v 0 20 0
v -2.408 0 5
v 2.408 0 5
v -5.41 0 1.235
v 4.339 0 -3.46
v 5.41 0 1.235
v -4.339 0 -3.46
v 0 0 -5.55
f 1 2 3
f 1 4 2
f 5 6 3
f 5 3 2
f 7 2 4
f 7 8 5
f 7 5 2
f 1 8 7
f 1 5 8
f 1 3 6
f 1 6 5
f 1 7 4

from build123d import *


with BuildPart() as part:
    # Sketch1 → Loft1 section 0
    with BuildSketch(Plane(origin=(0, 0, 0), x_dir=(1, 0, 0), z_dir=(0, 1, 0)), mode=Mode.PRIVATE) as loft1_s0:
        Polygon((5.410441731, -1.234898019), (4.338837391, 3.460107358), (0, 5.549581321), (-4.338837391, 3.460107358), (-5.410441731, -1.234898019), (-2.407873094, -5), (2.407873094, -5), align=None)
    loft([Vertex(0, 20, 0), loft1_s0.sketch])


solid = part.part
